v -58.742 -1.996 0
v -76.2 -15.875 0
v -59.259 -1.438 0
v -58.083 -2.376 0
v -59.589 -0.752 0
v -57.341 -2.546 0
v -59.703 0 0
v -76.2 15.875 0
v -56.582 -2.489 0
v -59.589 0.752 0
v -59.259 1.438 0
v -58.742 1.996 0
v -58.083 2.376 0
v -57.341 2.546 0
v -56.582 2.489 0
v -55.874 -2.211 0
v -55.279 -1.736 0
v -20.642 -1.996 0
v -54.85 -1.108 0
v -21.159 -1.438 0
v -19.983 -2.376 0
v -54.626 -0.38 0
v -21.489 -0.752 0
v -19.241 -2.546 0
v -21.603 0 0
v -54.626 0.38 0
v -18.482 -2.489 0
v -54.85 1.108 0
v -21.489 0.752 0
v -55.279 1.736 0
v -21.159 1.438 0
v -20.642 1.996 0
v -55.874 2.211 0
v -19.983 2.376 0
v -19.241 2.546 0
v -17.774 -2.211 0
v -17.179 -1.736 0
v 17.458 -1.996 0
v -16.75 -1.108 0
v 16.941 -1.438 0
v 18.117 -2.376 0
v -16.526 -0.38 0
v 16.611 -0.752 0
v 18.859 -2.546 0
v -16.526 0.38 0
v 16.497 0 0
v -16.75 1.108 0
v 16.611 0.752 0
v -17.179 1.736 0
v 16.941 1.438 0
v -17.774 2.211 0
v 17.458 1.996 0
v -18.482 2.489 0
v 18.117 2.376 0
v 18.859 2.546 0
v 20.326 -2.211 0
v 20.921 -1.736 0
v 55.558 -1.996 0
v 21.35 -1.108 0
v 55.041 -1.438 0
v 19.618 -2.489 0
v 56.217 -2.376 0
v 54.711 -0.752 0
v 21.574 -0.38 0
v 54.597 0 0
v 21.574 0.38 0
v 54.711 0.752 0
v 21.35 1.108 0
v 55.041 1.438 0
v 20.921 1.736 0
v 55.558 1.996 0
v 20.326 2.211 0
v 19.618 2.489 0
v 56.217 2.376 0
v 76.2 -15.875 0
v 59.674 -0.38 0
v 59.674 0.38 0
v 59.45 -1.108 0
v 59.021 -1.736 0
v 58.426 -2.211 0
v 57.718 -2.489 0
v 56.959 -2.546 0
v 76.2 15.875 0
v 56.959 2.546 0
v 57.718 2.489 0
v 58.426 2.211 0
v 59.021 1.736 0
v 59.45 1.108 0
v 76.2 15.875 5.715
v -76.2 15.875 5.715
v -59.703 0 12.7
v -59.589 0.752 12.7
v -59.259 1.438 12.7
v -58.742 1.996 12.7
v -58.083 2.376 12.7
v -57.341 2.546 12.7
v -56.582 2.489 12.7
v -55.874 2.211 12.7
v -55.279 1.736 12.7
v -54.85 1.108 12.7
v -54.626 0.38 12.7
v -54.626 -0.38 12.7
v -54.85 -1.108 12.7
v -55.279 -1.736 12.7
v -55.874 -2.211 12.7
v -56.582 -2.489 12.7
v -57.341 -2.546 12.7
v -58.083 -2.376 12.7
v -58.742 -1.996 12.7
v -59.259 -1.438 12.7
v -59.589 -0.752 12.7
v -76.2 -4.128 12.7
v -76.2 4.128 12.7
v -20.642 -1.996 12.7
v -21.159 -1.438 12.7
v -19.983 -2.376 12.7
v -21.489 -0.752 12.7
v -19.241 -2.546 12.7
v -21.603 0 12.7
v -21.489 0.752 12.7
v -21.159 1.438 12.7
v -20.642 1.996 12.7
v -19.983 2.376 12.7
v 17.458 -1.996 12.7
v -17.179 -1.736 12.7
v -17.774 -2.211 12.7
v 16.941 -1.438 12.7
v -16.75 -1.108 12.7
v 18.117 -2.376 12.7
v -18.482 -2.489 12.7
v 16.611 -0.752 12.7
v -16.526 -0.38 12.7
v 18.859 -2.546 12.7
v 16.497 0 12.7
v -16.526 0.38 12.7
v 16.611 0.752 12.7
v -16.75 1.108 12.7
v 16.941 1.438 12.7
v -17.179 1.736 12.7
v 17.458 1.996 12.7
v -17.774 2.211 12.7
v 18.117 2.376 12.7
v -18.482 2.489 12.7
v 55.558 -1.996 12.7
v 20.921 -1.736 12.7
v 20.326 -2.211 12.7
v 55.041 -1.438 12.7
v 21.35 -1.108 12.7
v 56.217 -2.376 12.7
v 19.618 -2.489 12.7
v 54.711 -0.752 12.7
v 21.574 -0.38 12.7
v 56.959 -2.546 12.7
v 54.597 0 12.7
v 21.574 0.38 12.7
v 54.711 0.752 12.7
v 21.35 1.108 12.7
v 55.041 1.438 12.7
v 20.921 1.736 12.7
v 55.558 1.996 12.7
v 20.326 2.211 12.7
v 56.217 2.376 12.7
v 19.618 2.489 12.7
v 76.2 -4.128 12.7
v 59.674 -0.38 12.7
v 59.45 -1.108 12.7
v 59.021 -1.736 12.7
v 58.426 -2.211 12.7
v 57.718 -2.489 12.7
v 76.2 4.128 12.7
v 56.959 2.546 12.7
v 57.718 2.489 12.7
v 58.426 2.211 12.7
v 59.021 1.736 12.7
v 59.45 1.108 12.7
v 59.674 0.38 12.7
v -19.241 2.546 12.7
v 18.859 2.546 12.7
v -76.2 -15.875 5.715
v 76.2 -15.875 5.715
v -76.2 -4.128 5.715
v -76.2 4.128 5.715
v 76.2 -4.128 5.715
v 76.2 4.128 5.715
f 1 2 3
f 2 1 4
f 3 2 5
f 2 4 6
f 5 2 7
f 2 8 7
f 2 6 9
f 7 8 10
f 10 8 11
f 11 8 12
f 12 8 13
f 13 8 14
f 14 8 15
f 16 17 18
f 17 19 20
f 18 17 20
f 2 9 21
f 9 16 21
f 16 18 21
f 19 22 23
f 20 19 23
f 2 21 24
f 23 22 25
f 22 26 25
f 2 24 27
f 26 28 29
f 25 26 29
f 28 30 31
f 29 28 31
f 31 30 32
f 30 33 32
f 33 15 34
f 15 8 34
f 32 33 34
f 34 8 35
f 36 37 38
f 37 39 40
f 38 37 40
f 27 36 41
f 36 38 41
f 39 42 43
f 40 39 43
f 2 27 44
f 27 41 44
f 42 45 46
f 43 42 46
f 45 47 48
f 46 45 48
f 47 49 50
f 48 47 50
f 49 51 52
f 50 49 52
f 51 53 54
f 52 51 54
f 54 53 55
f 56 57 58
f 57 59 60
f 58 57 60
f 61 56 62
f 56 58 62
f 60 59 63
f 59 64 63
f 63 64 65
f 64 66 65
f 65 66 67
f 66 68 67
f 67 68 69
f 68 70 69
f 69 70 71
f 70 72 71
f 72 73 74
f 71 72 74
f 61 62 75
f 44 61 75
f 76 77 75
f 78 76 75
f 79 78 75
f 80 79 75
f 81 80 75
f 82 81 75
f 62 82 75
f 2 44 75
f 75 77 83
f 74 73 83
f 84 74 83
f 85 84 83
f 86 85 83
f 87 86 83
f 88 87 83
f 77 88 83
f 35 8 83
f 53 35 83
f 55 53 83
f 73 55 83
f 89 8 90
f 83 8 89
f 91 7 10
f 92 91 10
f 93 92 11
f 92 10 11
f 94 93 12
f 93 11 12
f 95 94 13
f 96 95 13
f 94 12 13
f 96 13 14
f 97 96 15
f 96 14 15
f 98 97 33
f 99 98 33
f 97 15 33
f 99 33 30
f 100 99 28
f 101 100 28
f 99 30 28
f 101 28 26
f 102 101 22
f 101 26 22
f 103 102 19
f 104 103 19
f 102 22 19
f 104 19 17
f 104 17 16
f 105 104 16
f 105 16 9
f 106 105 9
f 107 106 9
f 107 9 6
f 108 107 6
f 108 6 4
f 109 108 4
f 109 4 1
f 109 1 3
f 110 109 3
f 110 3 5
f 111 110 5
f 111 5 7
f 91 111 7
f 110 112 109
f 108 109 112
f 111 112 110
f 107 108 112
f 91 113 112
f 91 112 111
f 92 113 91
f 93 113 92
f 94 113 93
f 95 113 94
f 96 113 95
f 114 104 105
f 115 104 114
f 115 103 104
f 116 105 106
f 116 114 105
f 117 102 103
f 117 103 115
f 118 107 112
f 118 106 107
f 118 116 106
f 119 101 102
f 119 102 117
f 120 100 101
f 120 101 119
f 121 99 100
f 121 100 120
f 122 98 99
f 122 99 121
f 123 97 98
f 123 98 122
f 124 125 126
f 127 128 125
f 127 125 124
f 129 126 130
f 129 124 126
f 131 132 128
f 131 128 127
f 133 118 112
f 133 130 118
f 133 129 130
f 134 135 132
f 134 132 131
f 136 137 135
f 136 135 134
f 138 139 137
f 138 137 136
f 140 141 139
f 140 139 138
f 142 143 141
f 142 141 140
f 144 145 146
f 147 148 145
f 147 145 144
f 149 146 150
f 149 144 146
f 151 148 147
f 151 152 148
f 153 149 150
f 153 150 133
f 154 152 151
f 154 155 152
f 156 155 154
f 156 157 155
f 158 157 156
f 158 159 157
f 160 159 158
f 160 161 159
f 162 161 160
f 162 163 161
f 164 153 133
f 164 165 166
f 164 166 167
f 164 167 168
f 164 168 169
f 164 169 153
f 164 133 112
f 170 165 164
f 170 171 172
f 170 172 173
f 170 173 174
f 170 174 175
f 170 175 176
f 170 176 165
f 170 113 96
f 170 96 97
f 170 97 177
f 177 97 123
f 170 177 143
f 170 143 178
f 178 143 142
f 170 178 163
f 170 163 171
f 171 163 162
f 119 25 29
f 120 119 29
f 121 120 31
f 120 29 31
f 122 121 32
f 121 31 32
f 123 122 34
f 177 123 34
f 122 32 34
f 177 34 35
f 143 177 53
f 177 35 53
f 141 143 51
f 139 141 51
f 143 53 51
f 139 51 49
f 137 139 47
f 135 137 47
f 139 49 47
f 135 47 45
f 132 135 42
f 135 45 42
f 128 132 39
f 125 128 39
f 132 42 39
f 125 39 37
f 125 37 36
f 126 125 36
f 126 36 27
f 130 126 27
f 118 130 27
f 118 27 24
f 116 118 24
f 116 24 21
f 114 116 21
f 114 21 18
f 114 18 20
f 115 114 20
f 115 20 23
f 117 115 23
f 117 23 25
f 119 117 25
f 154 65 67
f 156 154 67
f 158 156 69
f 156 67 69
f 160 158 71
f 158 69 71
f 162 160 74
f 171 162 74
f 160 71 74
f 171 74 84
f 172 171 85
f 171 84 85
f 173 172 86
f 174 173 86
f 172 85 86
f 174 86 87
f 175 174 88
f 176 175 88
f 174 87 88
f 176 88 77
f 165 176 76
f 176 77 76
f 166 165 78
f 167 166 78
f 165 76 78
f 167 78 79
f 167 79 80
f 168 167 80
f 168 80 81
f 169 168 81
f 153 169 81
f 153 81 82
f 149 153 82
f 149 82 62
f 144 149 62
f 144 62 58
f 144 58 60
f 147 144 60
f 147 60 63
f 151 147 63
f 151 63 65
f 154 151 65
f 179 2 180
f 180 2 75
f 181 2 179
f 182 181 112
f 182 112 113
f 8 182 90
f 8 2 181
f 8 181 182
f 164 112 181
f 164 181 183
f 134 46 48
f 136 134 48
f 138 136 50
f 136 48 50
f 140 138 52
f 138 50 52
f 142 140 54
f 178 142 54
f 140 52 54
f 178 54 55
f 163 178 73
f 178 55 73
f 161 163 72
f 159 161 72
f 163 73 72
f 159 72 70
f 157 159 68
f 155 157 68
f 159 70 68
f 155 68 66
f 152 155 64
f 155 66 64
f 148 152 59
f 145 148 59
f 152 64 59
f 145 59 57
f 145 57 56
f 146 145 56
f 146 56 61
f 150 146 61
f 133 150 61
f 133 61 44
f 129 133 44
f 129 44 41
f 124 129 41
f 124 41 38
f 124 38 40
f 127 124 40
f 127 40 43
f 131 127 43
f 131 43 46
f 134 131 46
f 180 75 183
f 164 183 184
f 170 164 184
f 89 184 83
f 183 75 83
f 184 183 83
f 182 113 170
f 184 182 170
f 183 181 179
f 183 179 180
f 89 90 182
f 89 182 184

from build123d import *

# Parameters (mm, degrees)
SKETCH1_W                   = 152.4
SKETCH1_H                   = 31.75
BOSS_EXTRUDE1_DEPTH         = 12.7
SKETCH2_W                   = 152.4
SKETCH2_H                   = 11.7475
CUT_EXTRUDE1_DEPTH          = 6.985
F_1_4_20_TAPPED_HOLE1_D     = 5.1054
F_1_4_20_TAPPED_HOLE1_DEPTH = 12.7


with BuildPart() as part:
    # Sketch1 → Boss-Extrude1 (new body)
    with BuildSketch(Plane.XY):
        Rectangle(SKETCH1_W, SKETCH1_H)
    extrude(amount=BOSS_EXTRUDE1_DEPTH)

    # Sketch2 → Cut-Extrude1 (cut)
    with BuildSketch(Plane.XY.offset(12.7)):
        with Locations((0, 10.00125)):
            Rectangle(SKETCH2_W, SKETCH2_H)
        with Locations((0, -10.00125)):
            Rectangle(SKETCH2_W, SKETCH2_H)
    extrude(amount=-CUT_EXTRUDE1_DEPTH, mode=Mode.SUBTRACT)

    # 1/4-20 Tapped Hole1
    with Locations(Plane.XY.offset(12.7)):
        with Locations((-57.15, 0), (-19.05, 0), (19.05, 0), (57.15, 0)):
            Hole(F_1_4_20_TAPPED_HOLE1_D / 2, depth=F_1_4_20_TAPPED_HOLE1_DEPTH)


solid = part.part
